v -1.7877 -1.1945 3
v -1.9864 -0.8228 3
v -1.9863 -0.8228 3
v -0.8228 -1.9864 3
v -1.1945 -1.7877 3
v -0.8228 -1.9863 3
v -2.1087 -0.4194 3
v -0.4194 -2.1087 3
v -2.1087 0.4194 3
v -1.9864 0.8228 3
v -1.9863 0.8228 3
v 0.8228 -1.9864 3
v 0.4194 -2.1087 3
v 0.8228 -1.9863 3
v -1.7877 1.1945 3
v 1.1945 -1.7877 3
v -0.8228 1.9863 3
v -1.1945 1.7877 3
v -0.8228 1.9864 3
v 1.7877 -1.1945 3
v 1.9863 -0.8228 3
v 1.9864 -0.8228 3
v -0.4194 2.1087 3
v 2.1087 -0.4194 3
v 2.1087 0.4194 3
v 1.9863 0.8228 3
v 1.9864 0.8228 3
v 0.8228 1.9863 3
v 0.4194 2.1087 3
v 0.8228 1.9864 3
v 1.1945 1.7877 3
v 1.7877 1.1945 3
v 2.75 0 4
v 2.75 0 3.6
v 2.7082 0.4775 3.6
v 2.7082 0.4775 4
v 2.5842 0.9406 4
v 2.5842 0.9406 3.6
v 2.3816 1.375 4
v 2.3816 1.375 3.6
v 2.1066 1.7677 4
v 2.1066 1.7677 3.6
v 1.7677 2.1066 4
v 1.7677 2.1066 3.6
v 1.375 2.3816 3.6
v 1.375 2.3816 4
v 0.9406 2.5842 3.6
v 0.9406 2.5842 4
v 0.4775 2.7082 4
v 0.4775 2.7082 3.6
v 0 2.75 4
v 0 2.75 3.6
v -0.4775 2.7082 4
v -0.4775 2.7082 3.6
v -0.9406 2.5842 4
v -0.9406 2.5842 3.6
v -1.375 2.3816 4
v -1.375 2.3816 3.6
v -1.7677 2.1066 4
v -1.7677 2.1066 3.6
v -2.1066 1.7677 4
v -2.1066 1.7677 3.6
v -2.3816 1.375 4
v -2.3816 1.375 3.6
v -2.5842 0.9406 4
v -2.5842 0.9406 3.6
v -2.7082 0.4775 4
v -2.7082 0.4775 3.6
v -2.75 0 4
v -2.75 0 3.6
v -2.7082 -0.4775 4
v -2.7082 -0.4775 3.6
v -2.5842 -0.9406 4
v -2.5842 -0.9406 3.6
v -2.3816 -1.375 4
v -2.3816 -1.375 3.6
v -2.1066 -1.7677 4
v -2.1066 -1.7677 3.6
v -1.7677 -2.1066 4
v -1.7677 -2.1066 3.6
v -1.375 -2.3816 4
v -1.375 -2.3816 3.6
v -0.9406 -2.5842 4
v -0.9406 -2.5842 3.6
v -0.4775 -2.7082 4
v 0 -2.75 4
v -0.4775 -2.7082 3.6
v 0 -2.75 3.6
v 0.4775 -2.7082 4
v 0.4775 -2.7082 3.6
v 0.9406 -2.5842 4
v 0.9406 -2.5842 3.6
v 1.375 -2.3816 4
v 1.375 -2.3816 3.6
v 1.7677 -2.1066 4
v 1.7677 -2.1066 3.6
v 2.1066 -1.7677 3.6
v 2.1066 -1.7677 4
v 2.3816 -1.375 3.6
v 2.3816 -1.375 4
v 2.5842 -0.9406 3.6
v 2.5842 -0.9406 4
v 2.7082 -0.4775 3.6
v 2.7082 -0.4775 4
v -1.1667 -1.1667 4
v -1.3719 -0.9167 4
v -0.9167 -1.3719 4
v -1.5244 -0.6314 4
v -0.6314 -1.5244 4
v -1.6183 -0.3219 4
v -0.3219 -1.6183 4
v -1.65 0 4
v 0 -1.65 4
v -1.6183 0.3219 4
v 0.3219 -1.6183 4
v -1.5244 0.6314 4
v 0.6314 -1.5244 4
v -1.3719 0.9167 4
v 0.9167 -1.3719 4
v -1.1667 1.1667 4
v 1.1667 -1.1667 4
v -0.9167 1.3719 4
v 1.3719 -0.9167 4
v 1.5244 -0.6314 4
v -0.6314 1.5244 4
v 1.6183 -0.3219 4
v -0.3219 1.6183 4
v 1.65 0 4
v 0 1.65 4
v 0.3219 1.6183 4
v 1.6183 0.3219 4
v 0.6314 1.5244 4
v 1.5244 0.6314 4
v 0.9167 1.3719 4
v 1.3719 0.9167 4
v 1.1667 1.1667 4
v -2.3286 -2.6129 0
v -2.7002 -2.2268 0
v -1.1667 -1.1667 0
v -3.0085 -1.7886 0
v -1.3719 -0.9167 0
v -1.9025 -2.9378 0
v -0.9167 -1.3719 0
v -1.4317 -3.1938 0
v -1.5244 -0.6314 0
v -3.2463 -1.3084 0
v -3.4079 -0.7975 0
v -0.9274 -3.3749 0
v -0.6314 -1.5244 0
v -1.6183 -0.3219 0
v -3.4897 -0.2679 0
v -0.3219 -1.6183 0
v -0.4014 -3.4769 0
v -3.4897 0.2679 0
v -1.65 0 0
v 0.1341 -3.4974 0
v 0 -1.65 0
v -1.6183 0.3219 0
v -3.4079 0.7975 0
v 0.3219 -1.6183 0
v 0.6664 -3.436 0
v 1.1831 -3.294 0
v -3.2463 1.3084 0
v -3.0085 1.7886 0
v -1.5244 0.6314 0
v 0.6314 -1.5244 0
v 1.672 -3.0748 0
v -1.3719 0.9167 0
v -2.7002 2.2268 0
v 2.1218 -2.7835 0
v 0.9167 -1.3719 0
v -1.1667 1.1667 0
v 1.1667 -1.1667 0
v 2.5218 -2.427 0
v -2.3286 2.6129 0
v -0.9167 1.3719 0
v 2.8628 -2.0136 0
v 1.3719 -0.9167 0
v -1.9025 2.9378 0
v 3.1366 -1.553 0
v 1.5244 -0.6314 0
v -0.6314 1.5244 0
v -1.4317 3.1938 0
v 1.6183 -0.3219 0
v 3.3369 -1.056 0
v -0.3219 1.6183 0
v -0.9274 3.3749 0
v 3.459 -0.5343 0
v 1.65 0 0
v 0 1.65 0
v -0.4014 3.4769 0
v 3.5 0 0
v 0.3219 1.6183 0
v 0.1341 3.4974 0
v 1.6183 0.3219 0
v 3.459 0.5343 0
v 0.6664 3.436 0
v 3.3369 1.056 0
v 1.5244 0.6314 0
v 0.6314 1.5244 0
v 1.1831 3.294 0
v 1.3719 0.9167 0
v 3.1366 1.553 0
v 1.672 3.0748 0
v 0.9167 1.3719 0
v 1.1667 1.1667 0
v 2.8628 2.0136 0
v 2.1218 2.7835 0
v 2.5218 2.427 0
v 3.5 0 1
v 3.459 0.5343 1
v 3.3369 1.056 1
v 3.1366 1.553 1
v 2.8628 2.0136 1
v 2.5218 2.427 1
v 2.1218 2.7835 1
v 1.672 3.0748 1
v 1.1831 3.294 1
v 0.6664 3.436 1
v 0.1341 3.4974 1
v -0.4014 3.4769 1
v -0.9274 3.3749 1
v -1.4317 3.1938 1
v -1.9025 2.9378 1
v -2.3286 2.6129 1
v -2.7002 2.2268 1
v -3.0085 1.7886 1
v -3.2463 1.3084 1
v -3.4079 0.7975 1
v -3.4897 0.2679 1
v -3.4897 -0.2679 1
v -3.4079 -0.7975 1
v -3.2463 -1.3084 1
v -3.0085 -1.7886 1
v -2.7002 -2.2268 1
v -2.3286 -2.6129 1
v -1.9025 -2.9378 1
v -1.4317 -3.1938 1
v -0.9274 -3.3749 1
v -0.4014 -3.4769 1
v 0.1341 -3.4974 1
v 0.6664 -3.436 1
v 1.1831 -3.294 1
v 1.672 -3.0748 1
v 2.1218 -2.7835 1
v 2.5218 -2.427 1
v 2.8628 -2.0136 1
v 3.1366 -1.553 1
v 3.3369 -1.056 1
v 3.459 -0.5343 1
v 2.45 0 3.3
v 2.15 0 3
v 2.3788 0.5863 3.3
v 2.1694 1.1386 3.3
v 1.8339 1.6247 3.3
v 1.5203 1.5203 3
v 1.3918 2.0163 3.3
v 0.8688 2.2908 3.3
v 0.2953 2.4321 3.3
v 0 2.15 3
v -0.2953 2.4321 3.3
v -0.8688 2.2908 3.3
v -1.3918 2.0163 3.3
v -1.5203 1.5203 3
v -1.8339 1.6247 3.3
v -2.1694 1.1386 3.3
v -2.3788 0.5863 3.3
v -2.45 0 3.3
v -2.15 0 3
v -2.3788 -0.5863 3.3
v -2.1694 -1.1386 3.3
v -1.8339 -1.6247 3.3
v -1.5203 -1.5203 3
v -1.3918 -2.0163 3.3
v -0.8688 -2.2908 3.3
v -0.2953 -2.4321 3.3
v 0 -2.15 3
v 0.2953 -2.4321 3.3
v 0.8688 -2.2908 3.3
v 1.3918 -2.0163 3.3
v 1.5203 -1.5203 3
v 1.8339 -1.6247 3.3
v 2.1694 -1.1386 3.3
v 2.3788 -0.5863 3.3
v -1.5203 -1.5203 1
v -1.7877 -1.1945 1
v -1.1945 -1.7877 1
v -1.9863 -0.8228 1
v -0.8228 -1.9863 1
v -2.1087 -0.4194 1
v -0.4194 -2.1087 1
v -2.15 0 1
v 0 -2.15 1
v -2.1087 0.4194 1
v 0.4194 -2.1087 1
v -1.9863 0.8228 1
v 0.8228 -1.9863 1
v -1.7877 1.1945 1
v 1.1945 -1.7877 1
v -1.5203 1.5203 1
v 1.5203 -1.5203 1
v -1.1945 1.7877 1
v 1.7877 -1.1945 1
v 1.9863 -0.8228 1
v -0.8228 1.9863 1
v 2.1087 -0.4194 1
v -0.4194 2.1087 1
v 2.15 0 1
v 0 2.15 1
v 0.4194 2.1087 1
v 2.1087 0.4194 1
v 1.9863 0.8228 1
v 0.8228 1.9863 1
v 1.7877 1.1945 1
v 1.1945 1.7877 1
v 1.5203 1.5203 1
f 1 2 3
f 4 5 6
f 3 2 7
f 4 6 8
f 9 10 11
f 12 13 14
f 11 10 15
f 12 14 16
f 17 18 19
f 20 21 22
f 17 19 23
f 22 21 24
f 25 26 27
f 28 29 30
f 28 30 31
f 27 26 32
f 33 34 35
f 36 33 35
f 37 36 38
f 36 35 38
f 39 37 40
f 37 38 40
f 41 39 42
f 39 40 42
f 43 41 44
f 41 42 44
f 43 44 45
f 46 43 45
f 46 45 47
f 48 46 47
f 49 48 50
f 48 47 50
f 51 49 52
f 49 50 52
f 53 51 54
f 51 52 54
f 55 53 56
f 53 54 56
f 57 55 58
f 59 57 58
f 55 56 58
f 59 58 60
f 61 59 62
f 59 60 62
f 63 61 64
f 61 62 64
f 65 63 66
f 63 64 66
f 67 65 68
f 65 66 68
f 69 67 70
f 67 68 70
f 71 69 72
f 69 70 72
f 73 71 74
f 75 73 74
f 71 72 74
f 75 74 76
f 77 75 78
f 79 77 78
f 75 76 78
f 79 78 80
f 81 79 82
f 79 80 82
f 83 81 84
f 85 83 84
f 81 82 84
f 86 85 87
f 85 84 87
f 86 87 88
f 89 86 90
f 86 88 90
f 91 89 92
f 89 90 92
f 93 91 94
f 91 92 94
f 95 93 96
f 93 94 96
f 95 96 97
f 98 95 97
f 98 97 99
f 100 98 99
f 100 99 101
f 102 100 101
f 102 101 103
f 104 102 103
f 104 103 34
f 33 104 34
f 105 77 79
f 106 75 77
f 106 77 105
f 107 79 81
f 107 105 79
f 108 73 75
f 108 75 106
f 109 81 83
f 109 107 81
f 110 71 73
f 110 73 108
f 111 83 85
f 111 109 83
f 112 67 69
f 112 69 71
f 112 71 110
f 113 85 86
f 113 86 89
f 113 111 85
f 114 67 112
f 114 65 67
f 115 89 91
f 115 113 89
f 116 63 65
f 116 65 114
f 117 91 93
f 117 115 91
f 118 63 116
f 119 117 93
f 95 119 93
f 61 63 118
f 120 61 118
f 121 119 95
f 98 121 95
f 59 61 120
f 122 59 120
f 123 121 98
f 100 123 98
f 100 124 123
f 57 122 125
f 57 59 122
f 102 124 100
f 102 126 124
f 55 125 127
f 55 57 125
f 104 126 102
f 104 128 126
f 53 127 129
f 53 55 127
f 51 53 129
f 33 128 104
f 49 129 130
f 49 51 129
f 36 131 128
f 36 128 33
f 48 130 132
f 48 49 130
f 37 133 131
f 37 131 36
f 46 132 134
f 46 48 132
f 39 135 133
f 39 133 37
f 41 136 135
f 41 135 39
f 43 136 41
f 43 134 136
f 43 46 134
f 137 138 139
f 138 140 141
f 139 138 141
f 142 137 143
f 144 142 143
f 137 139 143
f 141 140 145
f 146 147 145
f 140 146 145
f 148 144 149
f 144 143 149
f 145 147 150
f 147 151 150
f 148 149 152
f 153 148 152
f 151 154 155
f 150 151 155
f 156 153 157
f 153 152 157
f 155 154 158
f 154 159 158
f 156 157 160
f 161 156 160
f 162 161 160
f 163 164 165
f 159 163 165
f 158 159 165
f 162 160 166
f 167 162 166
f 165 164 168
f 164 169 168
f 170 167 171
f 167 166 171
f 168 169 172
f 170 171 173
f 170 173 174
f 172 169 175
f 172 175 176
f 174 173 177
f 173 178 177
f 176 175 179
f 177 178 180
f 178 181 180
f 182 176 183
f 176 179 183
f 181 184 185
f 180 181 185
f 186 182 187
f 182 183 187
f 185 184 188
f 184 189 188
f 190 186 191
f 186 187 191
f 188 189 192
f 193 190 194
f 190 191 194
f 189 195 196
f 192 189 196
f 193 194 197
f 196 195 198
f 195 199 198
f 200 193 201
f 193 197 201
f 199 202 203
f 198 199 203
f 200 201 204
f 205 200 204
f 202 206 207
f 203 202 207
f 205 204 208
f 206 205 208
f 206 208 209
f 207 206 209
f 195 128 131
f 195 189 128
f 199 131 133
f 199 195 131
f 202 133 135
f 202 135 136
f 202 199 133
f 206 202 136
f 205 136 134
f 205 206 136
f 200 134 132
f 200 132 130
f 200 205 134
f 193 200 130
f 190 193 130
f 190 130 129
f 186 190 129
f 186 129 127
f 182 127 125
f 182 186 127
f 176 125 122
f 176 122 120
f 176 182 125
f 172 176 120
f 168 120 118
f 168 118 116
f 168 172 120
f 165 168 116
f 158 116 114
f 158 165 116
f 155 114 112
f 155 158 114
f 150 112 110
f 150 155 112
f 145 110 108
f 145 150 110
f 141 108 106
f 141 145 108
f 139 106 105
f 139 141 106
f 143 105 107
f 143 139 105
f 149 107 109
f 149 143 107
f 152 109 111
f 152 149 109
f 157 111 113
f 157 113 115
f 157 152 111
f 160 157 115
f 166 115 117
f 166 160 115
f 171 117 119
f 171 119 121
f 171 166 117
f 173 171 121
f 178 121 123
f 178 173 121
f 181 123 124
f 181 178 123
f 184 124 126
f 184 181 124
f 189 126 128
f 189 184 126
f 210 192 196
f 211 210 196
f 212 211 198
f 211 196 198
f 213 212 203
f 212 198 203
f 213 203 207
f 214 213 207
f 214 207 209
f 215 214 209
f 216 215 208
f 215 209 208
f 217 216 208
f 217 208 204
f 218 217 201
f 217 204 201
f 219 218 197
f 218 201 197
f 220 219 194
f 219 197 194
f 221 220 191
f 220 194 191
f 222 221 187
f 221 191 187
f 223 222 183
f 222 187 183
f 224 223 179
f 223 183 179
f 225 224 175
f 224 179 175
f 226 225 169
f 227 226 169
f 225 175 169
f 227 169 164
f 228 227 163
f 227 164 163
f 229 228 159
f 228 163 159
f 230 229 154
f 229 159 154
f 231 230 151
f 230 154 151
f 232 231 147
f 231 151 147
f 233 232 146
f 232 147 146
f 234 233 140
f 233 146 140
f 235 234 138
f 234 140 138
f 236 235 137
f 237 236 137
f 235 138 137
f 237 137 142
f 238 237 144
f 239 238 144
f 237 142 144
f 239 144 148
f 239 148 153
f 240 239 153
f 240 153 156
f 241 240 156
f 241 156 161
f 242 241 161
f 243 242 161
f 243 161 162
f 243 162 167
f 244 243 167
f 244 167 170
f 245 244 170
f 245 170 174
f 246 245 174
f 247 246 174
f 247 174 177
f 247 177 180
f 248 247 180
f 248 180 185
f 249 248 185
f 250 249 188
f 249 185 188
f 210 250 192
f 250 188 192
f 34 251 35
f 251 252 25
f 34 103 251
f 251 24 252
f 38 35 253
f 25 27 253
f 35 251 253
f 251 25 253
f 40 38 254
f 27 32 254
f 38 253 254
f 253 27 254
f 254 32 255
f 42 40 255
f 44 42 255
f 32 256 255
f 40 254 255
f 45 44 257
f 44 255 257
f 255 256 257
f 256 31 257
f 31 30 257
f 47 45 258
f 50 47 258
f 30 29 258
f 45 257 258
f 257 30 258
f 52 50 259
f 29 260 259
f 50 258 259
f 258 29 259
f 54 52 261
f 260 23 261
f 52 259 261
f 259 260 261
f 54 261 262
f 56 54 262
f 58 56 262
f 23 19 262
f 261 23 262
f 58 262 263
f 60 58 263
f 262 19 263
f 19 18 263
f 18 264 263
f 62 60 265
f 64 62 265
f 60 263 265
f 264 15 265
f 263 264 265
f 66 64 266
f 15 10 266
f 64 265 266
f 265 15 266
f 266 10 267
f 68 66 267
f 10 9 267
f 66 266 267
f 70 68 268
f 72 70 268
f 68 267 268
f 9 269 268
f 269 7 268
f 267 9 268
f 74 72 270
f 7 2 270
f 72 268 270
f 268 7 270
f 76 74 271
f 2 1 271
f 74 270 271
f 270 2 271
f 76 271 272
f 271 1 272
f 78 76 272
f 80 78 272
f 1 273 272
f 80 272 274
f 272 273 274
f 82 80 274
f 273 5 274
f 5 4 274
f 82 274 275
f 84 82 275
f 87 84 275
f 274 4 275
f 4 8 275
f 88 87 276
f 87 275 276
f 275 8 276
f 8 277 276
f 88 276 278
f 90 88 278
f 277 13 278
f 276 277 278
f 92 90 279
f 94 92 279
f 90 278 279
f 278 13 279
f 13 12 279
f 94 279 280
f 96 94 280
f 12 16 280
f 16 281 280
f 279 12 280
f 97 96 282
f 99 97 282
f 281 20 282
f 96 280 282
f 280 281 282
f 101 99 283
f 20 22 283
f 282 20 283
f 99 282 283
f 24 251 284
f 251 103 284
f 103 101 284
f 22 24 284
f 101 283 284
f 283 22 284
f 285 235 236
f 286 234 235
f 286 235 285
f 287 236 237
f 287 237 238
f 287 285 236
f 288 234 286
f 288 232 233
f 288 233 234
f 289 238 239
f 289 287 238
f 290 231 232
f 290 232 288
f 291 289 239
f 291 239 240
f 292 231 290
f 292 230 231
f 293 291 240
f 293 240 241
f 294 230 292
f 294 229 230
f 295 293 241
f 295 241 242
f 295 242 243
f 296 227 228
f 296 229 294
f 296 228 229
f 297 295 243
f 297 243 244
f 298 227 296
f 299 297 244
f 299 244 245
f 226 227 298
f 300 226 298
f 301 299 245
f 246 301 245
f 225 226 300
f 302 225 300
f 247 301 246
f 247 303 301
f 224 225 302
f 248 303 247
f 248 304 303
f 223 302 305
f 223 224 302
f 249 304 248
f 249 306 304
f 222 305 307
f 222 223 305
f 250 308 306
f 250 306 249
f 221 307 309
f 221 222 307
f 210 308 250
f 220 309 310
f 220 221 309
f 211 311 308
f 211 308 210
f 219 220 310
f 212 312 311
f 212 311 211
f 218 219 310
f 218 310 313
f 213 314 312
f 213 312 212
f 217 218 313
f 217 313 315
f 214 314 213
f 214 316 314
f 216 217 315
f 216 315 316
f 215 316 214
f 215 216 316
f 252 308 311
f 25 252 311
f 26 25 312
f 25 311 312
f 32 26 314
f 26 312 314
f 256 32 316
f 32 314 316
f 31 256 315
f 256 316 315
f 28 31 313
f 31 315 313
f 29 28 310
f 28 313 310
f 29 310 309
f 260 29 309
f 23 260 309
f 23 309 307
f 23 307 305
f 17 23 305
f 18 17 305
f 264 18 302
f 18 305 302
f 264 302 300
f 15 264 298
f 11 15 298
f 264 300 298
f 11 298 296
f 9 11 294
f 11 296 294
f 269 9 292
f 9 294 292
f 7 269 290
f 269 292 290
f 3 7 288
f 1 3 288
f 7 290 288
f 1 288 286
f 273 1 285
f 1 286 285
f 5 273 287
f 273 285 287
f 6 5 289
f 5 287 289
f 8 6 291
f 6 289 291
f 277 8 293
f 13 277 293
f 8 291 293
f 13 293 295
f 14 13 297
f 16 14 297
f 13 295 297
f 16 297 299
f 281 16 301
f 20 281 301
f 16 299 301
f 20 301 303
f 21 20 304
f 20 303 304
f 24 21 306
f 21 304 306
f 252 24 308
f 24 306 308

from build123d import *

# Parameters (mm, degrees)
F0_R     = 3.5
F0_R_2   = 2.15
F0_R_3   = 1.65
F1_DEPTH = 1
F2_R     = 2.15
F2_R_2   = 1.65
F3_DEPTH = 2
F4_R     = 2.75
F4_R_2   = 2.15
F4_R_3   = 1.65
F5_DEPTH = 1
F6_SIZE  = 0.59999


# Not quite as in the source:
# - a fillet or chamfer is up to 0.001 mm smaller than in the source, because OpenCascade refuses the exact size


with BuildPart() as f1:
    # F0 (on Top) → F1 (new body)
    with BuildSketch(Plane.XY):
        Circle(F0_R)
        Circle(F0_R_2, mode=Mode.SUBTRACT)
        Circle(F0_R_2)
        Circle(F0_R_3, mode=Mode.SUBTRACT)
    extrude(amount=F1_DEPTH)

    # F2 (on face) → F3 (join)
    with BuildSketch(Plane.XY.offset(1)):
        Circle(F2_R)
        Circle(F2_R_2, mode=Mode.SUBTRACT)
    extrude(amount=F3_DEPTH)

    # F4 (on face) → F5 (join)
    with BuildSketch(Plane.XY.offset(3)):
        Circle(F4_R)
        Circle(F4_R_2, mode=Mode.SUBTRACT)
        Circle(F4_R_2)
        Circle(F4_R_3, mode=Mode.SUBTRACT)
    extrude(amount=F5_DEPTH)

    # F6 (size 0.6 in the source; OpenCascade refuses exactly that, so slightly less here)
    f6_edges = [f1.edges().sort_by_distance(p)[0] for p in [
        (-2.75, 0, 3),
    ]]
    chamfer(f6_edges, length=F6_SIZE)


solid = f1.part
